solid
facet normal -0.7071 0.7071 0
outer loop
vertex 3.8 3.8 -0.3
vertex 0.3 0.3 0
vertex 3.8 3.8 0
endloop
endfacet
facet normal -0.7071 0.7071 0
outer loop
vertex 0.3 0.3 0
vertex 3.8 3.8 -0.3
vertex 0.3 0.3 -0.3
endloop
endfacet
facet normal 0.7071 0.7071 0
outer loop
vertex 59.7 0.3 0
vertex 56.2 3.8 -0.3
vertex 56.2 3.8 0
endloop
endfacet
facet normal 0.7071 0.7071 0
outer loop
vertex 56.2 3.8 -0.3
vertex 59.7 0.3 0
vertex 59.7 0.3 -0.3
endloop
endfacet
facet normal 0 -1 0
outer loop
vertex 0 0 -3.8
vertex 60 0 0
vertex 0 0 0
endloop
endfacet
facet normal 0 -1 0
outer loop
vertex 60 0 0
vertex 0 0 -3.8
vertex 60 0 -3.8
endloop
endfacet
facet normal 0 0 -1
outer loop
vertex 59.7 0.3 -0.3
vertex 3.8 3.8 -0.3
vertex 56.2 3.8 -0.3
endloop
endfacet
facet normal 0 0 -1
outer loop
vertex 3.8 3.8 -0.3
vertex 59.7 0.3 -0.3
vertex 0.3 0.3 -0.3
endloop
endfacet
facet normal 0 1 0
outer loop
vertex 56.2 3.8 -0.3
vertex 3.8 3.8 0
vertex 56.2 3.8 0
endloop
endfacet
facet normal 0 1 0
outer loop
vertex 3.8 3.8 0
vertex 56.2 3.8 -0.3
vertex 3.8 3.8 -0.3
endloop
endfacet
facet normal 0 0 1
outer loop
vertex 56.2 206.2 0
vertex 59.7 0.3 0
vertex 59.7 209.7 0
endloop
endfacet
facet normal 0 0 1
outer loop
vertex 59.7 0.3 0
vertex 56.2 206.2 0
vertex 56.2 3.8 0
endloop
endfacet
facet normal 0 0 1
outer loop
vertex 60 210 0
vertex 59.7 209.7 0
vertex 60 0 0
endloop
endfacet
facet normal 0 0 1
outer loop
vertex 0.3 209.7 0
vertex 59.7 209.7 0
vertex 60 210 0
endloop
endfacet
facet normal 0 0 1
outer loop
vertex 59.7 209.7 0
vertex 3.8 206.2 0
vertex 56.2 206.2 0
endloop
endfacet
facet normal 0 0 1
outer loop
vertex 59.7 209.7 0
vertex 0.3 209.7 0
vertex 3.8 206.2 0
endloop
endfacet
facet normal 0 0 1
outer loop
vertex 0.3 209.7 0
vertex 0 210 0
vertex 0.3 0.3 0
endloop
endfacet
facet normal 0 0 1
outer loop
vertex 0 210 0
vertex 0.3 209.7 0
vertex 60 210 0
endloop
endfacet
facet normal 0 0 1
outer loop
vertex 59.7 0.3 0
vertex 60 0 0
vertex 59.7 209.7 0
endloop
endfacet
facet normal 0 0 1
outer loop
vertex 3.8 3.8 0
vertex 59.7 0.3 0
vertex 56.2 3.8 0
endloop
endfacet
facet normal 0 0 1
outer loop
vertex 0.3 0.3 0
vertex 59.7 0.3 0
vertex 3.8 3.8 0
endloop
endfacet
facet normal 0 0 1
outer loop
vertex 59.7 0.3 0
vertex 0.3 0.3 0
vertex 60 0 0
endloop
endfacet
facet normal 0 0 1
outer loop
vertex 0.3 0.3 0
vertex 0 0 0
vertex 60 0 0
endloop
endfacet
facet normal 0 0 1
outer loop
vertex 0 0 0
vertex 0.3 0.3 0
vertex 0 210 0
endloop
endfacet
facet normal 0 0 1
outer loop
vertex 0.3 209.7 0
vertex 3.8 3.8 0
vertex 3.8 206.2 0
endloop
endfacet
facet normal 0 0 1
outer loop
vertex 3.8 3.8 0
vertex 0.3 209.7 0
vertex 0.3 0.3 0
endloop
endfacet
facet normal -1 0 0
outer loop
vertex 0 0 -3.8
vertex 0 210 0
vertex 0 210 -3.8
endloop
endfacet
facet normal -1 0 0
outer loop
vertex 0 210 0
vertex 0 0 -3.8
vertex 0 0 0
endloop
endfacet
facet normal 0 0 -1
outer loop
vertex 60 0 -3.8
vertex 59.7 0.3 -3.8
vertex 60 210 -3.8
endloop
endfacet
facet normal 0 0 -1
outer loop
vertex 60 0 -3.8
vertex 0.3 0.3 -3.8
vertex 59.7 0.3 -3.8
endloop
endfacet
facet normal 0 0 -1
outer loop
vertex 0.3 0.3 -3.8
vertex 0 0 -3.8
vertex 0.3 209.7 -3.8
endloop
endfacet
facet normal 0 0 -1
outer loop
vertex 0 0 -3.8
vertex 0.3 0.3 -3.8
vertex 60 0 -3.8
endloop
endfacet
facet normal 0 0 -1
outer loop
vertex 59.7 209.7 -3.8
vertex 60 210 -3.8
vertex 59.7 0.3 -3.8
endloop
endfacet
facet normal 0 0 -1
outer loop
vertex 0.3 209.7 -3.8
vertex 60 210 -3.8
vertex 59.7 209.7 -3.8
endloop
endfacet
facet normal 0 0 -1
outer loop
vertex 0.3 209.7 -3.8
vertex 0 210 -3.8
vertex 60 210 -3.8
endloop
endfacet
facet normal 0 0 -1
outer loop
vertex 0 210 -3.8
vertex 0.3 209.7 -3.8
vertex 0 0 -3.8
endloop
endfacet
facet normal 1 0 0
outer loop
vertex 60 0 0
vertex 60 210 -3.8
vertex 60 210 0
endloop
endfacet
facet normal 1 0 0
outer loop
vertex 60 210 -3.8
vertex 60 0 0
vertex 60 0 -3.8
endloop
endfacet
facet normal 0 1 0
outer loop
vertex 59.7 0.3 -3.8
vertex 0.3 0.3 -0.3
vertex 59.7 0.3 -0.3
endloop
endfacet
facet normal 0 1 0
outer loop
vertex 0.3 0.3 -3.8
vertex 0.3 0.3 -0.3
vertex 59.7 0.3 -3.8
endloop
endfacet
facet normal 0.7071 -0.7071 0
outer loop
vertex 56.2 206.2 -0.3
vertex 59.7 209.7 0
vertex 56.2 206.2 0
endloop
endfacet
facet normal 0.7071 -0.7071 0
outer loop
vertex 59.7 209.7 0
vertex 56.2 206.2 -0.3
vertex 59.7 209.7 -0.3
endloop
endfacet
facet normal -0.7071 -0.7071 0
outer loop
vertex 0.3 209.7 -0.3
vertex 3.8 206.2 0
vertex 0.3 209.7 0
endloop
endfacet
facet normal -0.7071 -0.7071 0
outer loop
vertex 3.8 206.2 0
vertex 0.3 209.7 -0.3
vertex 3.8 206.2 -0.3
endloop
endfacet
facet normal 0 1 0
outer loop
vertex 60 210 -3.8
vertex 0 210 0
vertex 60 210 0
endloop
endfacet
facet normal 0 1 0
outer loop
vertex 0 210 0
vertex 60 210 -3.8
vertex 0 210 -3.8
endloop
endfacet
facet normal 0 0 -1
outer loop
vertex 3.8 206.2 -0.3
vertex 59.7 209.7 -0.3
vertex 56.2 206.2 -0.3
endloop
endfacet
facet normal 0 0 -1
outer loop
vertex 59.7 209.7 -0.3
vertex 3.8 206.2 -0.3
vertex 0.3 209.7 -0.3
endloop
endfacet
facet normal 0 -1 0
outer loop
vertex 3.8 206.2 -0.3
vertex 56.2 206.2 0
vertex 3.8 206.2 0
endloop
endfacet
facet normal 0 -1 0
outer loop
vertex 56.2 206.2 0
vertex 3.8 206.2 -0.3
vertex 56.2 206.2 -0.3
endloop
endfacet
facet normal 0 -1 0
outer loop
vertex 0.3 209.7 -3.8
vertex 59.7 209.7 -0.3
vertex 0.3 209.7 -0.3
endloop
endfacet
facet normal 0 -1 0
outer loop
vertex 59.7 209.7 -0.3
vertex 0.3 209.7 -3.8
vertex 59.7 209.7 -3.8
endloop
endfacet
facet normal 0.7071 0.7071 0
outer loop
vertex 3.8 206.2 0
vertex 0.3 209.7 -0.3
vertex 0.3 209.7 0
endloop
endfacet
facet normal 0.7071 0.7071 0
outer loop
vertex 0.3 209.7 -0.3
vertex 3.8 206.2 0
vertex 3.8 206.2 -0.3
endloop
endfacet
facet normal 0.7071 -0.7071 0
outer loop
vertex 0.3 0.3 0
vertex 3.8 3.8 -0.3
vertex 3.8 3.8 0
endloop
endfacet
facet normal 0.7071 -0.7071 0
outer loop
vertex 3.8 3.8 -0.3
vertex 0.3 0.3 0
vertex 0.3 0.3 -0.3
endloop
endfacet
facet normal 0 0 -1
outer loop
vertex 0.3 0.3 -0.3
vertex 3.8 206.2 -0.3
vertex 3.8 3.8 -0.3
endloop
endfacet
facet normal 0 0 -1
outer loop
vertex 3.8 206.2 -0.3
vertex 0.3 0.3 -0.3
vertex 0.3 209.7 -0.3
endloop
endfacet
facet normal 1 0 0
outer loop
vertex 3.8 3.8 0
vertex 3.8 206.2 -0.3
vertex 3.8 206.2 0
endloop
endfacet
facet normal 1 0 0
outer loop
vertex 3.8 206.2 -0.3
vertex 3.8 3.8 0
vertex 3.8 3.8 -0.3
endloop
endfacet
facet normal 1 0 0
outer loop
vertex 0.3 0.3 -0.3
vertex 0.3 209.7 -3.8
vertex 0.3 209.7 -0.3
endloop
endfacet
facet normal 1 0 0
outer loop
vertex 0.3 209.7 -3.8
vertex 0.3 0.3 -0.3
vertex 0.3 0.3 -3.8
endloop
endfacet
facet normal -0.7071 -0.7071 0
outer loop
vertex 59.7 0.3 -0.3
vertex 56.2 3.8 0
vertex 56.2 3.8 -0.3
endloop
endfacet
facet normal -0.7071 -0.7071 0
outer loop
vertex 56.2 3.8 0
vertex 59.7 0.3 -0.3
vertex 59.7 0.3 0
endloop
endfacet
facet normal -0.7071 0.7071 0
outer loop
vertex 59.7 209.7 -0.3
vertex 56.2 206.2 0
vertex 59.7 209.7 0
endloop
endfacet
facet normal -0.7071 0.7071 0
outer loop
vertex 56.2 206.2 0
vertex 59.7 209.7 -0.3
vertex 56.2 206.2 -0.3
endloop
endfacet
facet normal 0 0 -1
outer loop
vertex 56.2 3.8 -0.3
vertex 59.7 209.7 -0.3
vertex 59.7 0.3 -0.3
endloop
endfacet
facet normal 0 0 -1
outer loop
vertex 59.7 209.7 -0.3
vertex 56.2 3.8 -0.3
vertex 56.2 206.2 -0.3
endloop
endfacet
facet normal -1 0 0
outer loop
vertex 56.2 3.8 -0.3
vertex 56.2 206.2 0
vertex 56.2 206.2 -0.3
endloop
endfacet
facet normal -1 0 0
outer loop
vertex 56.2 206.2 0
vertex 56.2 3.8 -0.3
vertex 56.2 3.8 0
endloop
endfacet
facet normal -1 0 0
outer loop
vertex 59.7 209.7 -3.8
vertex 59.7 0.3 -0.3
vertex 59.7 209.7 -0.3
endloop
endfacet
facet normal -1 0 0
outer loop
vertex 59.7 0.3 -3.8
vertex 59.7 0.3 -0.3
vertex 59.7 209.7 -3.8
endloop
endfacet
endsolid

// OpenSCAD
// file: hdim.scad
module hdim(x1 = 10, x2 = 20, y = 10, dimline_lenght = 9.0) 
{
    dimline_overlap = 0.5;
    dimline_width = 0.3;
    text_size = 2;
    tmp = 2*dimline_overlap+text_size/2;
    text_pos = dimline_lenght>0 ? tmp : -tmp; 
    dimline_abs = dimline_lenght>0 ? dimline_lenght : -dimline_lenght;
    
    color([0,0,0])
    {
        translate([x1,y-dimline_lenght/2,0]) 
            square([dimline_width, 
                dimline_abs + 2*dimline_overlap], 
                center=true, $fs=0.01);
                
        translate([x2,y-dimline_lenght/2,0]) 
            square([dimline_width, 
                dimline_abs + 2*dimline_overlap], 
                center=true, $fs=0.01);

        translate([(x1+x2)/2,y-dimline_lenght,0]) 
            square([x2-x1, 
                dimline_width], 
                center=true, $fs=0.01);
    }
        
    translate([(x1+x2)/2,y-dimline_lenght-text_pos,0]) 
    {
        color([0,0,0])
        cube([text_size * 5, 1.2*text_size, 0.9], center=true);
        
        color([0.8,0.8,0.5,1.0])
        {
            translate([0,0,0.2])
            text(str(0.1*round((x2-x1)*10)), size = text_size, 
                halign = "center",valign = "center");
            translate([0,0,-0.2])
            rotate([0,180,0])
            text(str(0.1*round((x2-x1)*10)), size = text_size, 
                halign = "center",valign = "center");
        }
    }
}

hdim();
// main file
use <hdim.scad> 

bar_diam = 3.8;
bar_t  = 0.3;

module anglebarframe(length = 60, width = 210, explode=false)
{
    d = explode ? 20 : 0;
    c1 = [0.5,0.28,0.19, 1.0];
    c2 = [0.8,0.30,0.29, 1.0];
    
    rotate([0,180,0])
    {
    translate([-length,-d,0]) 
    anglebar(length, c1);
    translate([0,width+d,0]) 
    rotate([0,0,180])
    anglebar(length, c1);
    translate([d,0,0]) 
    rotate([0,0,90])
    anglebar(width, c2);
    translate([-length-d,width,0]) 
    rotate([0,0,-90])
    anglebar(width,c2);
    }
}        

module anglebar(length, c)
{
   color(c)
    {
        linear_extrude(bar_t) 
        polygon(points=[[0,0],
            [bar_diam, bar_diam],
            [length-bar_diam, bar_diam],
            [length, 0], [0,0]]);
 
        cube([length, bar_t, bar_diam]);
    }
}   


anglebarframe();
